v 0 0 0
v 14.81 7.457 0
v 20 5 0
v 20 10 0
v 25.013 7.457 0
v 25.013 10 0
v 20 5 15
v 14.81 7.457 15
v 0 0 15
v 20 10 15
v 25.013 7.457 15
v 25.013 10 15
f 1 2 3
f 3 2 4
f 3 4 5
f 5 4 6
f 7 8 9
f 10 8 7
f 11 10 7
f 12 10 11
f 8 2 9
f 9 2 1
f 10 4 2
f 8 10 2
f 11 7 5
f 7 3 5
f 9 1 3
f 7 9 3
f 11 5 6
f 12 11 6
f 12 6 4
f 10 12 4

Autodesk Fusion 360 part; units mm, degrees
sketch "Sketch4" plane through (0, 0, 0) normal (0, 0, 1) x (1, 0, 0)
  line L0 (0, 0) -> (30, 0)
  line L1 (30, 0) -> (30, 10)
  line L2 (30, 10) -> (0, 10)
  line L3 (0, 10) -> (0, 0)
sketch "Sketch5" plane through (0, 0, 0) normal (0, 0, 1) x (1, 0, 0)
  line L0 (0, 0) -> (20, 5)
  line L1 (20, 5) -> (25.0128, 7.4566)
  line L2 (25.0128, 7.4566) -> (25.0128, 10)
  line L3 (25.0128, 10) -> (20, 10)
  line L4 (20, 10) -> (14.8103, 7.4566)
  line L5 (14.8103, 7.4566) -> (0, 0)
extrude "Extrude9" add sketch "Sketch5" along normal blind 15
